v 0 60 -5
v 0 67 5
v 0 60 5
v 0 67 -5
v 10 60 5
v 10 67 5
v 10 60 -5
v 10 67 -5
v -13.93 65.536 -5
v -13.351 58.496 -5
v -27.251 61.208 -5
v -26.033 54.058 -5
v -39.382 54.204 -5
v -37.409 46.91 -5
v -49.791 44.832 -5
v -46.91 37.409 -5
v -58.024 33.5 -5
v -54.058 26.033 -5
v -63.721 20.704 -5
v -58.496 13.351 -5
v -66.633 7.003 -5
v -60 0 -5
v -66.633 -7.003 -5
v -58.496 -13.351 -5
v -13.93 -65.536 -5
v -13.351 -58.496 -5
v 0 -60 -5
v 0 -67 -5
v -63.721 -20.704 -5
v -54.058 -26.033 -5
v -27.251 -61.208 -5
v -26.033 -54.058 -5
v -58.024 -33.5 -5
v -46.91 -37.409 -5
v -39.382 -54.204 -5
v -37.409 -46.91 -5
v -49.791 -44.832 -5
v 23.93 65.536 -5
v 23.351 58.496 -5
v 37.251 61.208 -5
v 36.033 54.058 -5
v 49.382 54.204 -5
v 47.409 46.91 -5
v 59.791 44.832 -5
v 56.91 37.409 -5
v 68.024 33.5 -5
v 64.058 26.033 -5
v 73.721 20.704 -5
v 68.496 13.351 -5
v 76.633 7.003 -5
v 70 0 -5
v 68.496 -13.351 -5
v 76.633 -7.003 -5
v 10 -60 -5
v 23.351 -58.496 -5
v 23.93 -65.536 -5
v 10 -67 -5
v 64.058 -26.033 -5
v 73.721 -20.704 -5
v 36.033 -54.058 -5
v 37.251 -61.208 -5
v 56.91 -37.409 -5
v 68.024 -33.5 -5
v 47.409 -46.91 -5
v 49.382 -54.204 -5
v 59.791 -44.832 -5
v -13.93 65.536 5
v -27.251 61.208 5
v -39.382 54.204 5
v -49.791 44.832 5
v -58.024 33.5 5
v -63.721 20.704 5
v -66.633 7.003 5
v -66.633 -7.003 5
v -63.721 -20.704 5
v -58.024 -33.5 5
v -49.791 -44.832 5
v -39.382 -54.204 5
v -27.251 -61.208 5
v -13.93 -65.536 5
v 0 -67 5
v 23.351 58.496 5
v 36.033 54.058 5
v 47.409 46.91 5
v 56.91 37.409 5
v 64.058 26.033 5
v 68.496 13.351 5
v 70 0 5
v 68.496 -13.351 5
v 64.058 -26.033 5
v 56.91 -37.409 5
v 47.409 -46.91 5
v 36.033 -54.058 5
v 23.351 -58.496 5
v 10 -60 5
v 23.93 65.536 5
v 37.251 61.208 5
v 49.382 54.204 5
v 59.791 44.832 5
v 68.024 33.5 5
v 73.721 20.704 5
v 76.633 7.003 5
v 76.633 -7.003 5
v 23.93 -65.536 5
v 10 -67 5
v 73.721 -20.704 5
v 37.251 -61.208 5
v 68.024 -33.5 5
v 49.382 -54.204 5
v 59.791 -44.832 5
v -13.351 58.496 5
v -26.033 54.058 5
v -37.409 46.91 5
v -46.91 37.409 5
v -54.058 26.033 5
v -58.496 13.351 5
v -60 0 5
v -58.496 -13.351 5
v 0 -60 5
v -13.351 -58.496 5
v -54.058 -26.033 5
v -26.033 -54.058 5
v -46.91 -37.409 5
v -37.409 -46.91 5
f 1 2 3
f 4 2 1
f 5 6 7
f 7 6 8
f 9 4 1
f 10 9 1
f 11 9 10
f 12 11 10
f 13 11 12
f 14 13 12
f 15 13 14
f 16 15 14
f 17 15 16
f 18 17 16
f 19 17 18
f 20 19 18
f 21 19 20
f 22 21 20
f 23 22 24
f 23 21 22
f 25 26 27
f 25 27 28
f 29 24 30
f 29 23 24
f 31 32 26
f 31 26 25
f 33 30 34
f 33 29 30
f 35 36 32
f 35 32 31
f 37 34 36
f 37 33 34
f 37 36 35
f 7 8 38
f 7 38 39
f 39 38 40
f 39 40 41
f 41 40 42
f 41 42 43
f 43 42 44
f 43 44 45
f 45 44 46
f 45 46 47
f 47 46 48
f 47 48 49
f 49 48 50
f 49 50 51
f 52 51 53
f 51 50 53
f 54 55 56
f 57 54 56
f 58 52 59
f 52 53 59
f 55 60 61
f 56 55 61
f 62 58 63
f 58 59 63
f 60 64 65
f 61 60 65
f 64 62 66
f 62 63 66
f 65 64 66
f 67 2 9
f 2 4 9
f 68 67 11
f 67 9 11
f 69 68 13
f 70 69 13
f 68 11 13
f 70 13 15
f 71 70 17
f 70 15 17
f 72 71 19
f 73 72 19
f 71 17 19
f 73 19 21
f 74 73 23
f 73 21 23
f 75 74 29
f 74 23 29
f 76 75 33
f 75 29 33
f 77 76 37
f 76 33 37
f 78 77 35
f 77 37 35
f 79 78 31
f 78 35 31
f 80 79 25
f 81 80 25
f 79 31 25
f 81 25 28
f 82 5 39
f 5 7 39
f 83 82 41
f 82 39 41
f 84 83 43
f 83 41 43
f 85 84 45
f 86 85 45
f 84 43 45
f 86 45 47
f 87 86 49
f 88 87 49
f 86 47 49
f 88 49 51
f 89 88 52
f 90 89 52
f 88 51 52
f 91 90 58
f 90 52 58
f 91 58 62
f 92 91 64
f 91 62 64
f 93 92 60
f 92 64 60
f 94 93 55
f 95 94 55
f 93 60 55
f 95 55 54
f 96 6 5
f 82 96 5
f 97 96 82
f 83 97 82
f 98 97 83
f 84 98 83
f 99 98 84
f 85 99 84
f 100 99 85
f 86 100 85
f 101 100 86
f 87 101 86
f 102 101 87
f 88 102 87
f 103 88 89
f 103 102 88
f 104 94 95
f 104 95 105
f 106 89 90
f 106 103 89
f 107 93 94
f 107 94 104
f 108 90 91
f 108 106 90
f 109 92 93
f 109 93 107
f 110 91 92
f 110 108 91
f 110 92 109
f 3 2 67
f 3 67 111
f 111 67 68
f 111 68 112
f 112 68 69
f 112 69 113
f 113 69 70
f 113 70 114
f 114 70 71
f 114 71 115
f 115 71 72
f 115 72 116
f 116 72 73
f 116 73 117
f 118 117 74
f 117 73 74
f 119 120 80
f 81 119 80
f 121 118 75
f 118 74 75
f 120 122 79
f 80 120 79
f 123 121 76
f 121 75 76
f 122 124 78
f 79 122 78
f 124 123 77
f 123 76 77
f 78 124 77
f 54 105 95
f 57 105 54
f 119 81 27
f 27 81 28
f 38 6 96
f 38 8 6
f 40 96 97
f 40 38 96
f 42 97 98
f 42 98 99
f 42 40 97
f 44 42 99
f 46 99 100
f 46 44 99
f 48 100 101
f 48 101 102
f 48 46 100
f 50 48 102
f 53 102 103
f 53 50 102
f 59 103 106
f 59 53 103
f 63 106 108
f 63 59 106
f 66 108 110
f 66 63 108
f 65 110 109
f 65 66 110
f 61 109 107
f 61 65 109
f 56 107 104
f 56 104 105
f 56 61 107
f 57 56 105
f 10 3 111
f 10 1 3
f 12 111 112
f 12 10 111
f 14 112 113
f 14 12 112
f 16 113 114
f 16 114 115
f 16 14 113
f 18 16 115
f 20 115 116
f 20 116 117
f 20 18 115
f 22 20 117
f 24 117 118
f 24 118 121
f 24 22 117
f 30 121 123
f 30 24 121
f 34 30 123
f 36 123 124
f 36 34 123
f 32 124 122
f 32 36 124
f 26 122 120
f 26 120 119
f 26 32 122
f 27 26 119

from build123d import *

# Parameters (mm, degrees)
SKETCH1_W      = 10
SKETCH1_H      = 7
REVOLVE1_ANGLE = 180
SKETCH4_W      = 10
SKETCH4_H      = 7
REVOLVE3_ANGLE = 180


with BuildPart() as part:
    # Sketch1 → Revolve1 (revolve)
    with BuildSketch(Plane(origin=(0, 0, 0), x_dir=(0, 0, -1), z_dir=(1, 0, 0))):
        with Locations((0, 63.5)):
            Rectangle(SKETCH1_W, SKETCH1_H)
    revolve(axis=Axis((0, 0, 29.874383247), (0, 0, 1)), revolution_arc=REVOLVE1_ANGLE)


with BuildPart() as body_2:
    # Sketch4 → Revolve3 (revolve)
    with BuildSketch(Plane(origin=(10, 0, 0), x_dir=(0, 0, -1), z_dir=(1, 0, 0))):
        with Locations((0, 63.5)):
            Rectangle(SKETCH4_W, SKETCH4_H)
    revolve(axis=Axis((10, 0, 23.347655249), (0, 0, -1)), revolution_arc=REVOLVE3_ANGLE)


solid = Compound([part.part, body_2.part])
